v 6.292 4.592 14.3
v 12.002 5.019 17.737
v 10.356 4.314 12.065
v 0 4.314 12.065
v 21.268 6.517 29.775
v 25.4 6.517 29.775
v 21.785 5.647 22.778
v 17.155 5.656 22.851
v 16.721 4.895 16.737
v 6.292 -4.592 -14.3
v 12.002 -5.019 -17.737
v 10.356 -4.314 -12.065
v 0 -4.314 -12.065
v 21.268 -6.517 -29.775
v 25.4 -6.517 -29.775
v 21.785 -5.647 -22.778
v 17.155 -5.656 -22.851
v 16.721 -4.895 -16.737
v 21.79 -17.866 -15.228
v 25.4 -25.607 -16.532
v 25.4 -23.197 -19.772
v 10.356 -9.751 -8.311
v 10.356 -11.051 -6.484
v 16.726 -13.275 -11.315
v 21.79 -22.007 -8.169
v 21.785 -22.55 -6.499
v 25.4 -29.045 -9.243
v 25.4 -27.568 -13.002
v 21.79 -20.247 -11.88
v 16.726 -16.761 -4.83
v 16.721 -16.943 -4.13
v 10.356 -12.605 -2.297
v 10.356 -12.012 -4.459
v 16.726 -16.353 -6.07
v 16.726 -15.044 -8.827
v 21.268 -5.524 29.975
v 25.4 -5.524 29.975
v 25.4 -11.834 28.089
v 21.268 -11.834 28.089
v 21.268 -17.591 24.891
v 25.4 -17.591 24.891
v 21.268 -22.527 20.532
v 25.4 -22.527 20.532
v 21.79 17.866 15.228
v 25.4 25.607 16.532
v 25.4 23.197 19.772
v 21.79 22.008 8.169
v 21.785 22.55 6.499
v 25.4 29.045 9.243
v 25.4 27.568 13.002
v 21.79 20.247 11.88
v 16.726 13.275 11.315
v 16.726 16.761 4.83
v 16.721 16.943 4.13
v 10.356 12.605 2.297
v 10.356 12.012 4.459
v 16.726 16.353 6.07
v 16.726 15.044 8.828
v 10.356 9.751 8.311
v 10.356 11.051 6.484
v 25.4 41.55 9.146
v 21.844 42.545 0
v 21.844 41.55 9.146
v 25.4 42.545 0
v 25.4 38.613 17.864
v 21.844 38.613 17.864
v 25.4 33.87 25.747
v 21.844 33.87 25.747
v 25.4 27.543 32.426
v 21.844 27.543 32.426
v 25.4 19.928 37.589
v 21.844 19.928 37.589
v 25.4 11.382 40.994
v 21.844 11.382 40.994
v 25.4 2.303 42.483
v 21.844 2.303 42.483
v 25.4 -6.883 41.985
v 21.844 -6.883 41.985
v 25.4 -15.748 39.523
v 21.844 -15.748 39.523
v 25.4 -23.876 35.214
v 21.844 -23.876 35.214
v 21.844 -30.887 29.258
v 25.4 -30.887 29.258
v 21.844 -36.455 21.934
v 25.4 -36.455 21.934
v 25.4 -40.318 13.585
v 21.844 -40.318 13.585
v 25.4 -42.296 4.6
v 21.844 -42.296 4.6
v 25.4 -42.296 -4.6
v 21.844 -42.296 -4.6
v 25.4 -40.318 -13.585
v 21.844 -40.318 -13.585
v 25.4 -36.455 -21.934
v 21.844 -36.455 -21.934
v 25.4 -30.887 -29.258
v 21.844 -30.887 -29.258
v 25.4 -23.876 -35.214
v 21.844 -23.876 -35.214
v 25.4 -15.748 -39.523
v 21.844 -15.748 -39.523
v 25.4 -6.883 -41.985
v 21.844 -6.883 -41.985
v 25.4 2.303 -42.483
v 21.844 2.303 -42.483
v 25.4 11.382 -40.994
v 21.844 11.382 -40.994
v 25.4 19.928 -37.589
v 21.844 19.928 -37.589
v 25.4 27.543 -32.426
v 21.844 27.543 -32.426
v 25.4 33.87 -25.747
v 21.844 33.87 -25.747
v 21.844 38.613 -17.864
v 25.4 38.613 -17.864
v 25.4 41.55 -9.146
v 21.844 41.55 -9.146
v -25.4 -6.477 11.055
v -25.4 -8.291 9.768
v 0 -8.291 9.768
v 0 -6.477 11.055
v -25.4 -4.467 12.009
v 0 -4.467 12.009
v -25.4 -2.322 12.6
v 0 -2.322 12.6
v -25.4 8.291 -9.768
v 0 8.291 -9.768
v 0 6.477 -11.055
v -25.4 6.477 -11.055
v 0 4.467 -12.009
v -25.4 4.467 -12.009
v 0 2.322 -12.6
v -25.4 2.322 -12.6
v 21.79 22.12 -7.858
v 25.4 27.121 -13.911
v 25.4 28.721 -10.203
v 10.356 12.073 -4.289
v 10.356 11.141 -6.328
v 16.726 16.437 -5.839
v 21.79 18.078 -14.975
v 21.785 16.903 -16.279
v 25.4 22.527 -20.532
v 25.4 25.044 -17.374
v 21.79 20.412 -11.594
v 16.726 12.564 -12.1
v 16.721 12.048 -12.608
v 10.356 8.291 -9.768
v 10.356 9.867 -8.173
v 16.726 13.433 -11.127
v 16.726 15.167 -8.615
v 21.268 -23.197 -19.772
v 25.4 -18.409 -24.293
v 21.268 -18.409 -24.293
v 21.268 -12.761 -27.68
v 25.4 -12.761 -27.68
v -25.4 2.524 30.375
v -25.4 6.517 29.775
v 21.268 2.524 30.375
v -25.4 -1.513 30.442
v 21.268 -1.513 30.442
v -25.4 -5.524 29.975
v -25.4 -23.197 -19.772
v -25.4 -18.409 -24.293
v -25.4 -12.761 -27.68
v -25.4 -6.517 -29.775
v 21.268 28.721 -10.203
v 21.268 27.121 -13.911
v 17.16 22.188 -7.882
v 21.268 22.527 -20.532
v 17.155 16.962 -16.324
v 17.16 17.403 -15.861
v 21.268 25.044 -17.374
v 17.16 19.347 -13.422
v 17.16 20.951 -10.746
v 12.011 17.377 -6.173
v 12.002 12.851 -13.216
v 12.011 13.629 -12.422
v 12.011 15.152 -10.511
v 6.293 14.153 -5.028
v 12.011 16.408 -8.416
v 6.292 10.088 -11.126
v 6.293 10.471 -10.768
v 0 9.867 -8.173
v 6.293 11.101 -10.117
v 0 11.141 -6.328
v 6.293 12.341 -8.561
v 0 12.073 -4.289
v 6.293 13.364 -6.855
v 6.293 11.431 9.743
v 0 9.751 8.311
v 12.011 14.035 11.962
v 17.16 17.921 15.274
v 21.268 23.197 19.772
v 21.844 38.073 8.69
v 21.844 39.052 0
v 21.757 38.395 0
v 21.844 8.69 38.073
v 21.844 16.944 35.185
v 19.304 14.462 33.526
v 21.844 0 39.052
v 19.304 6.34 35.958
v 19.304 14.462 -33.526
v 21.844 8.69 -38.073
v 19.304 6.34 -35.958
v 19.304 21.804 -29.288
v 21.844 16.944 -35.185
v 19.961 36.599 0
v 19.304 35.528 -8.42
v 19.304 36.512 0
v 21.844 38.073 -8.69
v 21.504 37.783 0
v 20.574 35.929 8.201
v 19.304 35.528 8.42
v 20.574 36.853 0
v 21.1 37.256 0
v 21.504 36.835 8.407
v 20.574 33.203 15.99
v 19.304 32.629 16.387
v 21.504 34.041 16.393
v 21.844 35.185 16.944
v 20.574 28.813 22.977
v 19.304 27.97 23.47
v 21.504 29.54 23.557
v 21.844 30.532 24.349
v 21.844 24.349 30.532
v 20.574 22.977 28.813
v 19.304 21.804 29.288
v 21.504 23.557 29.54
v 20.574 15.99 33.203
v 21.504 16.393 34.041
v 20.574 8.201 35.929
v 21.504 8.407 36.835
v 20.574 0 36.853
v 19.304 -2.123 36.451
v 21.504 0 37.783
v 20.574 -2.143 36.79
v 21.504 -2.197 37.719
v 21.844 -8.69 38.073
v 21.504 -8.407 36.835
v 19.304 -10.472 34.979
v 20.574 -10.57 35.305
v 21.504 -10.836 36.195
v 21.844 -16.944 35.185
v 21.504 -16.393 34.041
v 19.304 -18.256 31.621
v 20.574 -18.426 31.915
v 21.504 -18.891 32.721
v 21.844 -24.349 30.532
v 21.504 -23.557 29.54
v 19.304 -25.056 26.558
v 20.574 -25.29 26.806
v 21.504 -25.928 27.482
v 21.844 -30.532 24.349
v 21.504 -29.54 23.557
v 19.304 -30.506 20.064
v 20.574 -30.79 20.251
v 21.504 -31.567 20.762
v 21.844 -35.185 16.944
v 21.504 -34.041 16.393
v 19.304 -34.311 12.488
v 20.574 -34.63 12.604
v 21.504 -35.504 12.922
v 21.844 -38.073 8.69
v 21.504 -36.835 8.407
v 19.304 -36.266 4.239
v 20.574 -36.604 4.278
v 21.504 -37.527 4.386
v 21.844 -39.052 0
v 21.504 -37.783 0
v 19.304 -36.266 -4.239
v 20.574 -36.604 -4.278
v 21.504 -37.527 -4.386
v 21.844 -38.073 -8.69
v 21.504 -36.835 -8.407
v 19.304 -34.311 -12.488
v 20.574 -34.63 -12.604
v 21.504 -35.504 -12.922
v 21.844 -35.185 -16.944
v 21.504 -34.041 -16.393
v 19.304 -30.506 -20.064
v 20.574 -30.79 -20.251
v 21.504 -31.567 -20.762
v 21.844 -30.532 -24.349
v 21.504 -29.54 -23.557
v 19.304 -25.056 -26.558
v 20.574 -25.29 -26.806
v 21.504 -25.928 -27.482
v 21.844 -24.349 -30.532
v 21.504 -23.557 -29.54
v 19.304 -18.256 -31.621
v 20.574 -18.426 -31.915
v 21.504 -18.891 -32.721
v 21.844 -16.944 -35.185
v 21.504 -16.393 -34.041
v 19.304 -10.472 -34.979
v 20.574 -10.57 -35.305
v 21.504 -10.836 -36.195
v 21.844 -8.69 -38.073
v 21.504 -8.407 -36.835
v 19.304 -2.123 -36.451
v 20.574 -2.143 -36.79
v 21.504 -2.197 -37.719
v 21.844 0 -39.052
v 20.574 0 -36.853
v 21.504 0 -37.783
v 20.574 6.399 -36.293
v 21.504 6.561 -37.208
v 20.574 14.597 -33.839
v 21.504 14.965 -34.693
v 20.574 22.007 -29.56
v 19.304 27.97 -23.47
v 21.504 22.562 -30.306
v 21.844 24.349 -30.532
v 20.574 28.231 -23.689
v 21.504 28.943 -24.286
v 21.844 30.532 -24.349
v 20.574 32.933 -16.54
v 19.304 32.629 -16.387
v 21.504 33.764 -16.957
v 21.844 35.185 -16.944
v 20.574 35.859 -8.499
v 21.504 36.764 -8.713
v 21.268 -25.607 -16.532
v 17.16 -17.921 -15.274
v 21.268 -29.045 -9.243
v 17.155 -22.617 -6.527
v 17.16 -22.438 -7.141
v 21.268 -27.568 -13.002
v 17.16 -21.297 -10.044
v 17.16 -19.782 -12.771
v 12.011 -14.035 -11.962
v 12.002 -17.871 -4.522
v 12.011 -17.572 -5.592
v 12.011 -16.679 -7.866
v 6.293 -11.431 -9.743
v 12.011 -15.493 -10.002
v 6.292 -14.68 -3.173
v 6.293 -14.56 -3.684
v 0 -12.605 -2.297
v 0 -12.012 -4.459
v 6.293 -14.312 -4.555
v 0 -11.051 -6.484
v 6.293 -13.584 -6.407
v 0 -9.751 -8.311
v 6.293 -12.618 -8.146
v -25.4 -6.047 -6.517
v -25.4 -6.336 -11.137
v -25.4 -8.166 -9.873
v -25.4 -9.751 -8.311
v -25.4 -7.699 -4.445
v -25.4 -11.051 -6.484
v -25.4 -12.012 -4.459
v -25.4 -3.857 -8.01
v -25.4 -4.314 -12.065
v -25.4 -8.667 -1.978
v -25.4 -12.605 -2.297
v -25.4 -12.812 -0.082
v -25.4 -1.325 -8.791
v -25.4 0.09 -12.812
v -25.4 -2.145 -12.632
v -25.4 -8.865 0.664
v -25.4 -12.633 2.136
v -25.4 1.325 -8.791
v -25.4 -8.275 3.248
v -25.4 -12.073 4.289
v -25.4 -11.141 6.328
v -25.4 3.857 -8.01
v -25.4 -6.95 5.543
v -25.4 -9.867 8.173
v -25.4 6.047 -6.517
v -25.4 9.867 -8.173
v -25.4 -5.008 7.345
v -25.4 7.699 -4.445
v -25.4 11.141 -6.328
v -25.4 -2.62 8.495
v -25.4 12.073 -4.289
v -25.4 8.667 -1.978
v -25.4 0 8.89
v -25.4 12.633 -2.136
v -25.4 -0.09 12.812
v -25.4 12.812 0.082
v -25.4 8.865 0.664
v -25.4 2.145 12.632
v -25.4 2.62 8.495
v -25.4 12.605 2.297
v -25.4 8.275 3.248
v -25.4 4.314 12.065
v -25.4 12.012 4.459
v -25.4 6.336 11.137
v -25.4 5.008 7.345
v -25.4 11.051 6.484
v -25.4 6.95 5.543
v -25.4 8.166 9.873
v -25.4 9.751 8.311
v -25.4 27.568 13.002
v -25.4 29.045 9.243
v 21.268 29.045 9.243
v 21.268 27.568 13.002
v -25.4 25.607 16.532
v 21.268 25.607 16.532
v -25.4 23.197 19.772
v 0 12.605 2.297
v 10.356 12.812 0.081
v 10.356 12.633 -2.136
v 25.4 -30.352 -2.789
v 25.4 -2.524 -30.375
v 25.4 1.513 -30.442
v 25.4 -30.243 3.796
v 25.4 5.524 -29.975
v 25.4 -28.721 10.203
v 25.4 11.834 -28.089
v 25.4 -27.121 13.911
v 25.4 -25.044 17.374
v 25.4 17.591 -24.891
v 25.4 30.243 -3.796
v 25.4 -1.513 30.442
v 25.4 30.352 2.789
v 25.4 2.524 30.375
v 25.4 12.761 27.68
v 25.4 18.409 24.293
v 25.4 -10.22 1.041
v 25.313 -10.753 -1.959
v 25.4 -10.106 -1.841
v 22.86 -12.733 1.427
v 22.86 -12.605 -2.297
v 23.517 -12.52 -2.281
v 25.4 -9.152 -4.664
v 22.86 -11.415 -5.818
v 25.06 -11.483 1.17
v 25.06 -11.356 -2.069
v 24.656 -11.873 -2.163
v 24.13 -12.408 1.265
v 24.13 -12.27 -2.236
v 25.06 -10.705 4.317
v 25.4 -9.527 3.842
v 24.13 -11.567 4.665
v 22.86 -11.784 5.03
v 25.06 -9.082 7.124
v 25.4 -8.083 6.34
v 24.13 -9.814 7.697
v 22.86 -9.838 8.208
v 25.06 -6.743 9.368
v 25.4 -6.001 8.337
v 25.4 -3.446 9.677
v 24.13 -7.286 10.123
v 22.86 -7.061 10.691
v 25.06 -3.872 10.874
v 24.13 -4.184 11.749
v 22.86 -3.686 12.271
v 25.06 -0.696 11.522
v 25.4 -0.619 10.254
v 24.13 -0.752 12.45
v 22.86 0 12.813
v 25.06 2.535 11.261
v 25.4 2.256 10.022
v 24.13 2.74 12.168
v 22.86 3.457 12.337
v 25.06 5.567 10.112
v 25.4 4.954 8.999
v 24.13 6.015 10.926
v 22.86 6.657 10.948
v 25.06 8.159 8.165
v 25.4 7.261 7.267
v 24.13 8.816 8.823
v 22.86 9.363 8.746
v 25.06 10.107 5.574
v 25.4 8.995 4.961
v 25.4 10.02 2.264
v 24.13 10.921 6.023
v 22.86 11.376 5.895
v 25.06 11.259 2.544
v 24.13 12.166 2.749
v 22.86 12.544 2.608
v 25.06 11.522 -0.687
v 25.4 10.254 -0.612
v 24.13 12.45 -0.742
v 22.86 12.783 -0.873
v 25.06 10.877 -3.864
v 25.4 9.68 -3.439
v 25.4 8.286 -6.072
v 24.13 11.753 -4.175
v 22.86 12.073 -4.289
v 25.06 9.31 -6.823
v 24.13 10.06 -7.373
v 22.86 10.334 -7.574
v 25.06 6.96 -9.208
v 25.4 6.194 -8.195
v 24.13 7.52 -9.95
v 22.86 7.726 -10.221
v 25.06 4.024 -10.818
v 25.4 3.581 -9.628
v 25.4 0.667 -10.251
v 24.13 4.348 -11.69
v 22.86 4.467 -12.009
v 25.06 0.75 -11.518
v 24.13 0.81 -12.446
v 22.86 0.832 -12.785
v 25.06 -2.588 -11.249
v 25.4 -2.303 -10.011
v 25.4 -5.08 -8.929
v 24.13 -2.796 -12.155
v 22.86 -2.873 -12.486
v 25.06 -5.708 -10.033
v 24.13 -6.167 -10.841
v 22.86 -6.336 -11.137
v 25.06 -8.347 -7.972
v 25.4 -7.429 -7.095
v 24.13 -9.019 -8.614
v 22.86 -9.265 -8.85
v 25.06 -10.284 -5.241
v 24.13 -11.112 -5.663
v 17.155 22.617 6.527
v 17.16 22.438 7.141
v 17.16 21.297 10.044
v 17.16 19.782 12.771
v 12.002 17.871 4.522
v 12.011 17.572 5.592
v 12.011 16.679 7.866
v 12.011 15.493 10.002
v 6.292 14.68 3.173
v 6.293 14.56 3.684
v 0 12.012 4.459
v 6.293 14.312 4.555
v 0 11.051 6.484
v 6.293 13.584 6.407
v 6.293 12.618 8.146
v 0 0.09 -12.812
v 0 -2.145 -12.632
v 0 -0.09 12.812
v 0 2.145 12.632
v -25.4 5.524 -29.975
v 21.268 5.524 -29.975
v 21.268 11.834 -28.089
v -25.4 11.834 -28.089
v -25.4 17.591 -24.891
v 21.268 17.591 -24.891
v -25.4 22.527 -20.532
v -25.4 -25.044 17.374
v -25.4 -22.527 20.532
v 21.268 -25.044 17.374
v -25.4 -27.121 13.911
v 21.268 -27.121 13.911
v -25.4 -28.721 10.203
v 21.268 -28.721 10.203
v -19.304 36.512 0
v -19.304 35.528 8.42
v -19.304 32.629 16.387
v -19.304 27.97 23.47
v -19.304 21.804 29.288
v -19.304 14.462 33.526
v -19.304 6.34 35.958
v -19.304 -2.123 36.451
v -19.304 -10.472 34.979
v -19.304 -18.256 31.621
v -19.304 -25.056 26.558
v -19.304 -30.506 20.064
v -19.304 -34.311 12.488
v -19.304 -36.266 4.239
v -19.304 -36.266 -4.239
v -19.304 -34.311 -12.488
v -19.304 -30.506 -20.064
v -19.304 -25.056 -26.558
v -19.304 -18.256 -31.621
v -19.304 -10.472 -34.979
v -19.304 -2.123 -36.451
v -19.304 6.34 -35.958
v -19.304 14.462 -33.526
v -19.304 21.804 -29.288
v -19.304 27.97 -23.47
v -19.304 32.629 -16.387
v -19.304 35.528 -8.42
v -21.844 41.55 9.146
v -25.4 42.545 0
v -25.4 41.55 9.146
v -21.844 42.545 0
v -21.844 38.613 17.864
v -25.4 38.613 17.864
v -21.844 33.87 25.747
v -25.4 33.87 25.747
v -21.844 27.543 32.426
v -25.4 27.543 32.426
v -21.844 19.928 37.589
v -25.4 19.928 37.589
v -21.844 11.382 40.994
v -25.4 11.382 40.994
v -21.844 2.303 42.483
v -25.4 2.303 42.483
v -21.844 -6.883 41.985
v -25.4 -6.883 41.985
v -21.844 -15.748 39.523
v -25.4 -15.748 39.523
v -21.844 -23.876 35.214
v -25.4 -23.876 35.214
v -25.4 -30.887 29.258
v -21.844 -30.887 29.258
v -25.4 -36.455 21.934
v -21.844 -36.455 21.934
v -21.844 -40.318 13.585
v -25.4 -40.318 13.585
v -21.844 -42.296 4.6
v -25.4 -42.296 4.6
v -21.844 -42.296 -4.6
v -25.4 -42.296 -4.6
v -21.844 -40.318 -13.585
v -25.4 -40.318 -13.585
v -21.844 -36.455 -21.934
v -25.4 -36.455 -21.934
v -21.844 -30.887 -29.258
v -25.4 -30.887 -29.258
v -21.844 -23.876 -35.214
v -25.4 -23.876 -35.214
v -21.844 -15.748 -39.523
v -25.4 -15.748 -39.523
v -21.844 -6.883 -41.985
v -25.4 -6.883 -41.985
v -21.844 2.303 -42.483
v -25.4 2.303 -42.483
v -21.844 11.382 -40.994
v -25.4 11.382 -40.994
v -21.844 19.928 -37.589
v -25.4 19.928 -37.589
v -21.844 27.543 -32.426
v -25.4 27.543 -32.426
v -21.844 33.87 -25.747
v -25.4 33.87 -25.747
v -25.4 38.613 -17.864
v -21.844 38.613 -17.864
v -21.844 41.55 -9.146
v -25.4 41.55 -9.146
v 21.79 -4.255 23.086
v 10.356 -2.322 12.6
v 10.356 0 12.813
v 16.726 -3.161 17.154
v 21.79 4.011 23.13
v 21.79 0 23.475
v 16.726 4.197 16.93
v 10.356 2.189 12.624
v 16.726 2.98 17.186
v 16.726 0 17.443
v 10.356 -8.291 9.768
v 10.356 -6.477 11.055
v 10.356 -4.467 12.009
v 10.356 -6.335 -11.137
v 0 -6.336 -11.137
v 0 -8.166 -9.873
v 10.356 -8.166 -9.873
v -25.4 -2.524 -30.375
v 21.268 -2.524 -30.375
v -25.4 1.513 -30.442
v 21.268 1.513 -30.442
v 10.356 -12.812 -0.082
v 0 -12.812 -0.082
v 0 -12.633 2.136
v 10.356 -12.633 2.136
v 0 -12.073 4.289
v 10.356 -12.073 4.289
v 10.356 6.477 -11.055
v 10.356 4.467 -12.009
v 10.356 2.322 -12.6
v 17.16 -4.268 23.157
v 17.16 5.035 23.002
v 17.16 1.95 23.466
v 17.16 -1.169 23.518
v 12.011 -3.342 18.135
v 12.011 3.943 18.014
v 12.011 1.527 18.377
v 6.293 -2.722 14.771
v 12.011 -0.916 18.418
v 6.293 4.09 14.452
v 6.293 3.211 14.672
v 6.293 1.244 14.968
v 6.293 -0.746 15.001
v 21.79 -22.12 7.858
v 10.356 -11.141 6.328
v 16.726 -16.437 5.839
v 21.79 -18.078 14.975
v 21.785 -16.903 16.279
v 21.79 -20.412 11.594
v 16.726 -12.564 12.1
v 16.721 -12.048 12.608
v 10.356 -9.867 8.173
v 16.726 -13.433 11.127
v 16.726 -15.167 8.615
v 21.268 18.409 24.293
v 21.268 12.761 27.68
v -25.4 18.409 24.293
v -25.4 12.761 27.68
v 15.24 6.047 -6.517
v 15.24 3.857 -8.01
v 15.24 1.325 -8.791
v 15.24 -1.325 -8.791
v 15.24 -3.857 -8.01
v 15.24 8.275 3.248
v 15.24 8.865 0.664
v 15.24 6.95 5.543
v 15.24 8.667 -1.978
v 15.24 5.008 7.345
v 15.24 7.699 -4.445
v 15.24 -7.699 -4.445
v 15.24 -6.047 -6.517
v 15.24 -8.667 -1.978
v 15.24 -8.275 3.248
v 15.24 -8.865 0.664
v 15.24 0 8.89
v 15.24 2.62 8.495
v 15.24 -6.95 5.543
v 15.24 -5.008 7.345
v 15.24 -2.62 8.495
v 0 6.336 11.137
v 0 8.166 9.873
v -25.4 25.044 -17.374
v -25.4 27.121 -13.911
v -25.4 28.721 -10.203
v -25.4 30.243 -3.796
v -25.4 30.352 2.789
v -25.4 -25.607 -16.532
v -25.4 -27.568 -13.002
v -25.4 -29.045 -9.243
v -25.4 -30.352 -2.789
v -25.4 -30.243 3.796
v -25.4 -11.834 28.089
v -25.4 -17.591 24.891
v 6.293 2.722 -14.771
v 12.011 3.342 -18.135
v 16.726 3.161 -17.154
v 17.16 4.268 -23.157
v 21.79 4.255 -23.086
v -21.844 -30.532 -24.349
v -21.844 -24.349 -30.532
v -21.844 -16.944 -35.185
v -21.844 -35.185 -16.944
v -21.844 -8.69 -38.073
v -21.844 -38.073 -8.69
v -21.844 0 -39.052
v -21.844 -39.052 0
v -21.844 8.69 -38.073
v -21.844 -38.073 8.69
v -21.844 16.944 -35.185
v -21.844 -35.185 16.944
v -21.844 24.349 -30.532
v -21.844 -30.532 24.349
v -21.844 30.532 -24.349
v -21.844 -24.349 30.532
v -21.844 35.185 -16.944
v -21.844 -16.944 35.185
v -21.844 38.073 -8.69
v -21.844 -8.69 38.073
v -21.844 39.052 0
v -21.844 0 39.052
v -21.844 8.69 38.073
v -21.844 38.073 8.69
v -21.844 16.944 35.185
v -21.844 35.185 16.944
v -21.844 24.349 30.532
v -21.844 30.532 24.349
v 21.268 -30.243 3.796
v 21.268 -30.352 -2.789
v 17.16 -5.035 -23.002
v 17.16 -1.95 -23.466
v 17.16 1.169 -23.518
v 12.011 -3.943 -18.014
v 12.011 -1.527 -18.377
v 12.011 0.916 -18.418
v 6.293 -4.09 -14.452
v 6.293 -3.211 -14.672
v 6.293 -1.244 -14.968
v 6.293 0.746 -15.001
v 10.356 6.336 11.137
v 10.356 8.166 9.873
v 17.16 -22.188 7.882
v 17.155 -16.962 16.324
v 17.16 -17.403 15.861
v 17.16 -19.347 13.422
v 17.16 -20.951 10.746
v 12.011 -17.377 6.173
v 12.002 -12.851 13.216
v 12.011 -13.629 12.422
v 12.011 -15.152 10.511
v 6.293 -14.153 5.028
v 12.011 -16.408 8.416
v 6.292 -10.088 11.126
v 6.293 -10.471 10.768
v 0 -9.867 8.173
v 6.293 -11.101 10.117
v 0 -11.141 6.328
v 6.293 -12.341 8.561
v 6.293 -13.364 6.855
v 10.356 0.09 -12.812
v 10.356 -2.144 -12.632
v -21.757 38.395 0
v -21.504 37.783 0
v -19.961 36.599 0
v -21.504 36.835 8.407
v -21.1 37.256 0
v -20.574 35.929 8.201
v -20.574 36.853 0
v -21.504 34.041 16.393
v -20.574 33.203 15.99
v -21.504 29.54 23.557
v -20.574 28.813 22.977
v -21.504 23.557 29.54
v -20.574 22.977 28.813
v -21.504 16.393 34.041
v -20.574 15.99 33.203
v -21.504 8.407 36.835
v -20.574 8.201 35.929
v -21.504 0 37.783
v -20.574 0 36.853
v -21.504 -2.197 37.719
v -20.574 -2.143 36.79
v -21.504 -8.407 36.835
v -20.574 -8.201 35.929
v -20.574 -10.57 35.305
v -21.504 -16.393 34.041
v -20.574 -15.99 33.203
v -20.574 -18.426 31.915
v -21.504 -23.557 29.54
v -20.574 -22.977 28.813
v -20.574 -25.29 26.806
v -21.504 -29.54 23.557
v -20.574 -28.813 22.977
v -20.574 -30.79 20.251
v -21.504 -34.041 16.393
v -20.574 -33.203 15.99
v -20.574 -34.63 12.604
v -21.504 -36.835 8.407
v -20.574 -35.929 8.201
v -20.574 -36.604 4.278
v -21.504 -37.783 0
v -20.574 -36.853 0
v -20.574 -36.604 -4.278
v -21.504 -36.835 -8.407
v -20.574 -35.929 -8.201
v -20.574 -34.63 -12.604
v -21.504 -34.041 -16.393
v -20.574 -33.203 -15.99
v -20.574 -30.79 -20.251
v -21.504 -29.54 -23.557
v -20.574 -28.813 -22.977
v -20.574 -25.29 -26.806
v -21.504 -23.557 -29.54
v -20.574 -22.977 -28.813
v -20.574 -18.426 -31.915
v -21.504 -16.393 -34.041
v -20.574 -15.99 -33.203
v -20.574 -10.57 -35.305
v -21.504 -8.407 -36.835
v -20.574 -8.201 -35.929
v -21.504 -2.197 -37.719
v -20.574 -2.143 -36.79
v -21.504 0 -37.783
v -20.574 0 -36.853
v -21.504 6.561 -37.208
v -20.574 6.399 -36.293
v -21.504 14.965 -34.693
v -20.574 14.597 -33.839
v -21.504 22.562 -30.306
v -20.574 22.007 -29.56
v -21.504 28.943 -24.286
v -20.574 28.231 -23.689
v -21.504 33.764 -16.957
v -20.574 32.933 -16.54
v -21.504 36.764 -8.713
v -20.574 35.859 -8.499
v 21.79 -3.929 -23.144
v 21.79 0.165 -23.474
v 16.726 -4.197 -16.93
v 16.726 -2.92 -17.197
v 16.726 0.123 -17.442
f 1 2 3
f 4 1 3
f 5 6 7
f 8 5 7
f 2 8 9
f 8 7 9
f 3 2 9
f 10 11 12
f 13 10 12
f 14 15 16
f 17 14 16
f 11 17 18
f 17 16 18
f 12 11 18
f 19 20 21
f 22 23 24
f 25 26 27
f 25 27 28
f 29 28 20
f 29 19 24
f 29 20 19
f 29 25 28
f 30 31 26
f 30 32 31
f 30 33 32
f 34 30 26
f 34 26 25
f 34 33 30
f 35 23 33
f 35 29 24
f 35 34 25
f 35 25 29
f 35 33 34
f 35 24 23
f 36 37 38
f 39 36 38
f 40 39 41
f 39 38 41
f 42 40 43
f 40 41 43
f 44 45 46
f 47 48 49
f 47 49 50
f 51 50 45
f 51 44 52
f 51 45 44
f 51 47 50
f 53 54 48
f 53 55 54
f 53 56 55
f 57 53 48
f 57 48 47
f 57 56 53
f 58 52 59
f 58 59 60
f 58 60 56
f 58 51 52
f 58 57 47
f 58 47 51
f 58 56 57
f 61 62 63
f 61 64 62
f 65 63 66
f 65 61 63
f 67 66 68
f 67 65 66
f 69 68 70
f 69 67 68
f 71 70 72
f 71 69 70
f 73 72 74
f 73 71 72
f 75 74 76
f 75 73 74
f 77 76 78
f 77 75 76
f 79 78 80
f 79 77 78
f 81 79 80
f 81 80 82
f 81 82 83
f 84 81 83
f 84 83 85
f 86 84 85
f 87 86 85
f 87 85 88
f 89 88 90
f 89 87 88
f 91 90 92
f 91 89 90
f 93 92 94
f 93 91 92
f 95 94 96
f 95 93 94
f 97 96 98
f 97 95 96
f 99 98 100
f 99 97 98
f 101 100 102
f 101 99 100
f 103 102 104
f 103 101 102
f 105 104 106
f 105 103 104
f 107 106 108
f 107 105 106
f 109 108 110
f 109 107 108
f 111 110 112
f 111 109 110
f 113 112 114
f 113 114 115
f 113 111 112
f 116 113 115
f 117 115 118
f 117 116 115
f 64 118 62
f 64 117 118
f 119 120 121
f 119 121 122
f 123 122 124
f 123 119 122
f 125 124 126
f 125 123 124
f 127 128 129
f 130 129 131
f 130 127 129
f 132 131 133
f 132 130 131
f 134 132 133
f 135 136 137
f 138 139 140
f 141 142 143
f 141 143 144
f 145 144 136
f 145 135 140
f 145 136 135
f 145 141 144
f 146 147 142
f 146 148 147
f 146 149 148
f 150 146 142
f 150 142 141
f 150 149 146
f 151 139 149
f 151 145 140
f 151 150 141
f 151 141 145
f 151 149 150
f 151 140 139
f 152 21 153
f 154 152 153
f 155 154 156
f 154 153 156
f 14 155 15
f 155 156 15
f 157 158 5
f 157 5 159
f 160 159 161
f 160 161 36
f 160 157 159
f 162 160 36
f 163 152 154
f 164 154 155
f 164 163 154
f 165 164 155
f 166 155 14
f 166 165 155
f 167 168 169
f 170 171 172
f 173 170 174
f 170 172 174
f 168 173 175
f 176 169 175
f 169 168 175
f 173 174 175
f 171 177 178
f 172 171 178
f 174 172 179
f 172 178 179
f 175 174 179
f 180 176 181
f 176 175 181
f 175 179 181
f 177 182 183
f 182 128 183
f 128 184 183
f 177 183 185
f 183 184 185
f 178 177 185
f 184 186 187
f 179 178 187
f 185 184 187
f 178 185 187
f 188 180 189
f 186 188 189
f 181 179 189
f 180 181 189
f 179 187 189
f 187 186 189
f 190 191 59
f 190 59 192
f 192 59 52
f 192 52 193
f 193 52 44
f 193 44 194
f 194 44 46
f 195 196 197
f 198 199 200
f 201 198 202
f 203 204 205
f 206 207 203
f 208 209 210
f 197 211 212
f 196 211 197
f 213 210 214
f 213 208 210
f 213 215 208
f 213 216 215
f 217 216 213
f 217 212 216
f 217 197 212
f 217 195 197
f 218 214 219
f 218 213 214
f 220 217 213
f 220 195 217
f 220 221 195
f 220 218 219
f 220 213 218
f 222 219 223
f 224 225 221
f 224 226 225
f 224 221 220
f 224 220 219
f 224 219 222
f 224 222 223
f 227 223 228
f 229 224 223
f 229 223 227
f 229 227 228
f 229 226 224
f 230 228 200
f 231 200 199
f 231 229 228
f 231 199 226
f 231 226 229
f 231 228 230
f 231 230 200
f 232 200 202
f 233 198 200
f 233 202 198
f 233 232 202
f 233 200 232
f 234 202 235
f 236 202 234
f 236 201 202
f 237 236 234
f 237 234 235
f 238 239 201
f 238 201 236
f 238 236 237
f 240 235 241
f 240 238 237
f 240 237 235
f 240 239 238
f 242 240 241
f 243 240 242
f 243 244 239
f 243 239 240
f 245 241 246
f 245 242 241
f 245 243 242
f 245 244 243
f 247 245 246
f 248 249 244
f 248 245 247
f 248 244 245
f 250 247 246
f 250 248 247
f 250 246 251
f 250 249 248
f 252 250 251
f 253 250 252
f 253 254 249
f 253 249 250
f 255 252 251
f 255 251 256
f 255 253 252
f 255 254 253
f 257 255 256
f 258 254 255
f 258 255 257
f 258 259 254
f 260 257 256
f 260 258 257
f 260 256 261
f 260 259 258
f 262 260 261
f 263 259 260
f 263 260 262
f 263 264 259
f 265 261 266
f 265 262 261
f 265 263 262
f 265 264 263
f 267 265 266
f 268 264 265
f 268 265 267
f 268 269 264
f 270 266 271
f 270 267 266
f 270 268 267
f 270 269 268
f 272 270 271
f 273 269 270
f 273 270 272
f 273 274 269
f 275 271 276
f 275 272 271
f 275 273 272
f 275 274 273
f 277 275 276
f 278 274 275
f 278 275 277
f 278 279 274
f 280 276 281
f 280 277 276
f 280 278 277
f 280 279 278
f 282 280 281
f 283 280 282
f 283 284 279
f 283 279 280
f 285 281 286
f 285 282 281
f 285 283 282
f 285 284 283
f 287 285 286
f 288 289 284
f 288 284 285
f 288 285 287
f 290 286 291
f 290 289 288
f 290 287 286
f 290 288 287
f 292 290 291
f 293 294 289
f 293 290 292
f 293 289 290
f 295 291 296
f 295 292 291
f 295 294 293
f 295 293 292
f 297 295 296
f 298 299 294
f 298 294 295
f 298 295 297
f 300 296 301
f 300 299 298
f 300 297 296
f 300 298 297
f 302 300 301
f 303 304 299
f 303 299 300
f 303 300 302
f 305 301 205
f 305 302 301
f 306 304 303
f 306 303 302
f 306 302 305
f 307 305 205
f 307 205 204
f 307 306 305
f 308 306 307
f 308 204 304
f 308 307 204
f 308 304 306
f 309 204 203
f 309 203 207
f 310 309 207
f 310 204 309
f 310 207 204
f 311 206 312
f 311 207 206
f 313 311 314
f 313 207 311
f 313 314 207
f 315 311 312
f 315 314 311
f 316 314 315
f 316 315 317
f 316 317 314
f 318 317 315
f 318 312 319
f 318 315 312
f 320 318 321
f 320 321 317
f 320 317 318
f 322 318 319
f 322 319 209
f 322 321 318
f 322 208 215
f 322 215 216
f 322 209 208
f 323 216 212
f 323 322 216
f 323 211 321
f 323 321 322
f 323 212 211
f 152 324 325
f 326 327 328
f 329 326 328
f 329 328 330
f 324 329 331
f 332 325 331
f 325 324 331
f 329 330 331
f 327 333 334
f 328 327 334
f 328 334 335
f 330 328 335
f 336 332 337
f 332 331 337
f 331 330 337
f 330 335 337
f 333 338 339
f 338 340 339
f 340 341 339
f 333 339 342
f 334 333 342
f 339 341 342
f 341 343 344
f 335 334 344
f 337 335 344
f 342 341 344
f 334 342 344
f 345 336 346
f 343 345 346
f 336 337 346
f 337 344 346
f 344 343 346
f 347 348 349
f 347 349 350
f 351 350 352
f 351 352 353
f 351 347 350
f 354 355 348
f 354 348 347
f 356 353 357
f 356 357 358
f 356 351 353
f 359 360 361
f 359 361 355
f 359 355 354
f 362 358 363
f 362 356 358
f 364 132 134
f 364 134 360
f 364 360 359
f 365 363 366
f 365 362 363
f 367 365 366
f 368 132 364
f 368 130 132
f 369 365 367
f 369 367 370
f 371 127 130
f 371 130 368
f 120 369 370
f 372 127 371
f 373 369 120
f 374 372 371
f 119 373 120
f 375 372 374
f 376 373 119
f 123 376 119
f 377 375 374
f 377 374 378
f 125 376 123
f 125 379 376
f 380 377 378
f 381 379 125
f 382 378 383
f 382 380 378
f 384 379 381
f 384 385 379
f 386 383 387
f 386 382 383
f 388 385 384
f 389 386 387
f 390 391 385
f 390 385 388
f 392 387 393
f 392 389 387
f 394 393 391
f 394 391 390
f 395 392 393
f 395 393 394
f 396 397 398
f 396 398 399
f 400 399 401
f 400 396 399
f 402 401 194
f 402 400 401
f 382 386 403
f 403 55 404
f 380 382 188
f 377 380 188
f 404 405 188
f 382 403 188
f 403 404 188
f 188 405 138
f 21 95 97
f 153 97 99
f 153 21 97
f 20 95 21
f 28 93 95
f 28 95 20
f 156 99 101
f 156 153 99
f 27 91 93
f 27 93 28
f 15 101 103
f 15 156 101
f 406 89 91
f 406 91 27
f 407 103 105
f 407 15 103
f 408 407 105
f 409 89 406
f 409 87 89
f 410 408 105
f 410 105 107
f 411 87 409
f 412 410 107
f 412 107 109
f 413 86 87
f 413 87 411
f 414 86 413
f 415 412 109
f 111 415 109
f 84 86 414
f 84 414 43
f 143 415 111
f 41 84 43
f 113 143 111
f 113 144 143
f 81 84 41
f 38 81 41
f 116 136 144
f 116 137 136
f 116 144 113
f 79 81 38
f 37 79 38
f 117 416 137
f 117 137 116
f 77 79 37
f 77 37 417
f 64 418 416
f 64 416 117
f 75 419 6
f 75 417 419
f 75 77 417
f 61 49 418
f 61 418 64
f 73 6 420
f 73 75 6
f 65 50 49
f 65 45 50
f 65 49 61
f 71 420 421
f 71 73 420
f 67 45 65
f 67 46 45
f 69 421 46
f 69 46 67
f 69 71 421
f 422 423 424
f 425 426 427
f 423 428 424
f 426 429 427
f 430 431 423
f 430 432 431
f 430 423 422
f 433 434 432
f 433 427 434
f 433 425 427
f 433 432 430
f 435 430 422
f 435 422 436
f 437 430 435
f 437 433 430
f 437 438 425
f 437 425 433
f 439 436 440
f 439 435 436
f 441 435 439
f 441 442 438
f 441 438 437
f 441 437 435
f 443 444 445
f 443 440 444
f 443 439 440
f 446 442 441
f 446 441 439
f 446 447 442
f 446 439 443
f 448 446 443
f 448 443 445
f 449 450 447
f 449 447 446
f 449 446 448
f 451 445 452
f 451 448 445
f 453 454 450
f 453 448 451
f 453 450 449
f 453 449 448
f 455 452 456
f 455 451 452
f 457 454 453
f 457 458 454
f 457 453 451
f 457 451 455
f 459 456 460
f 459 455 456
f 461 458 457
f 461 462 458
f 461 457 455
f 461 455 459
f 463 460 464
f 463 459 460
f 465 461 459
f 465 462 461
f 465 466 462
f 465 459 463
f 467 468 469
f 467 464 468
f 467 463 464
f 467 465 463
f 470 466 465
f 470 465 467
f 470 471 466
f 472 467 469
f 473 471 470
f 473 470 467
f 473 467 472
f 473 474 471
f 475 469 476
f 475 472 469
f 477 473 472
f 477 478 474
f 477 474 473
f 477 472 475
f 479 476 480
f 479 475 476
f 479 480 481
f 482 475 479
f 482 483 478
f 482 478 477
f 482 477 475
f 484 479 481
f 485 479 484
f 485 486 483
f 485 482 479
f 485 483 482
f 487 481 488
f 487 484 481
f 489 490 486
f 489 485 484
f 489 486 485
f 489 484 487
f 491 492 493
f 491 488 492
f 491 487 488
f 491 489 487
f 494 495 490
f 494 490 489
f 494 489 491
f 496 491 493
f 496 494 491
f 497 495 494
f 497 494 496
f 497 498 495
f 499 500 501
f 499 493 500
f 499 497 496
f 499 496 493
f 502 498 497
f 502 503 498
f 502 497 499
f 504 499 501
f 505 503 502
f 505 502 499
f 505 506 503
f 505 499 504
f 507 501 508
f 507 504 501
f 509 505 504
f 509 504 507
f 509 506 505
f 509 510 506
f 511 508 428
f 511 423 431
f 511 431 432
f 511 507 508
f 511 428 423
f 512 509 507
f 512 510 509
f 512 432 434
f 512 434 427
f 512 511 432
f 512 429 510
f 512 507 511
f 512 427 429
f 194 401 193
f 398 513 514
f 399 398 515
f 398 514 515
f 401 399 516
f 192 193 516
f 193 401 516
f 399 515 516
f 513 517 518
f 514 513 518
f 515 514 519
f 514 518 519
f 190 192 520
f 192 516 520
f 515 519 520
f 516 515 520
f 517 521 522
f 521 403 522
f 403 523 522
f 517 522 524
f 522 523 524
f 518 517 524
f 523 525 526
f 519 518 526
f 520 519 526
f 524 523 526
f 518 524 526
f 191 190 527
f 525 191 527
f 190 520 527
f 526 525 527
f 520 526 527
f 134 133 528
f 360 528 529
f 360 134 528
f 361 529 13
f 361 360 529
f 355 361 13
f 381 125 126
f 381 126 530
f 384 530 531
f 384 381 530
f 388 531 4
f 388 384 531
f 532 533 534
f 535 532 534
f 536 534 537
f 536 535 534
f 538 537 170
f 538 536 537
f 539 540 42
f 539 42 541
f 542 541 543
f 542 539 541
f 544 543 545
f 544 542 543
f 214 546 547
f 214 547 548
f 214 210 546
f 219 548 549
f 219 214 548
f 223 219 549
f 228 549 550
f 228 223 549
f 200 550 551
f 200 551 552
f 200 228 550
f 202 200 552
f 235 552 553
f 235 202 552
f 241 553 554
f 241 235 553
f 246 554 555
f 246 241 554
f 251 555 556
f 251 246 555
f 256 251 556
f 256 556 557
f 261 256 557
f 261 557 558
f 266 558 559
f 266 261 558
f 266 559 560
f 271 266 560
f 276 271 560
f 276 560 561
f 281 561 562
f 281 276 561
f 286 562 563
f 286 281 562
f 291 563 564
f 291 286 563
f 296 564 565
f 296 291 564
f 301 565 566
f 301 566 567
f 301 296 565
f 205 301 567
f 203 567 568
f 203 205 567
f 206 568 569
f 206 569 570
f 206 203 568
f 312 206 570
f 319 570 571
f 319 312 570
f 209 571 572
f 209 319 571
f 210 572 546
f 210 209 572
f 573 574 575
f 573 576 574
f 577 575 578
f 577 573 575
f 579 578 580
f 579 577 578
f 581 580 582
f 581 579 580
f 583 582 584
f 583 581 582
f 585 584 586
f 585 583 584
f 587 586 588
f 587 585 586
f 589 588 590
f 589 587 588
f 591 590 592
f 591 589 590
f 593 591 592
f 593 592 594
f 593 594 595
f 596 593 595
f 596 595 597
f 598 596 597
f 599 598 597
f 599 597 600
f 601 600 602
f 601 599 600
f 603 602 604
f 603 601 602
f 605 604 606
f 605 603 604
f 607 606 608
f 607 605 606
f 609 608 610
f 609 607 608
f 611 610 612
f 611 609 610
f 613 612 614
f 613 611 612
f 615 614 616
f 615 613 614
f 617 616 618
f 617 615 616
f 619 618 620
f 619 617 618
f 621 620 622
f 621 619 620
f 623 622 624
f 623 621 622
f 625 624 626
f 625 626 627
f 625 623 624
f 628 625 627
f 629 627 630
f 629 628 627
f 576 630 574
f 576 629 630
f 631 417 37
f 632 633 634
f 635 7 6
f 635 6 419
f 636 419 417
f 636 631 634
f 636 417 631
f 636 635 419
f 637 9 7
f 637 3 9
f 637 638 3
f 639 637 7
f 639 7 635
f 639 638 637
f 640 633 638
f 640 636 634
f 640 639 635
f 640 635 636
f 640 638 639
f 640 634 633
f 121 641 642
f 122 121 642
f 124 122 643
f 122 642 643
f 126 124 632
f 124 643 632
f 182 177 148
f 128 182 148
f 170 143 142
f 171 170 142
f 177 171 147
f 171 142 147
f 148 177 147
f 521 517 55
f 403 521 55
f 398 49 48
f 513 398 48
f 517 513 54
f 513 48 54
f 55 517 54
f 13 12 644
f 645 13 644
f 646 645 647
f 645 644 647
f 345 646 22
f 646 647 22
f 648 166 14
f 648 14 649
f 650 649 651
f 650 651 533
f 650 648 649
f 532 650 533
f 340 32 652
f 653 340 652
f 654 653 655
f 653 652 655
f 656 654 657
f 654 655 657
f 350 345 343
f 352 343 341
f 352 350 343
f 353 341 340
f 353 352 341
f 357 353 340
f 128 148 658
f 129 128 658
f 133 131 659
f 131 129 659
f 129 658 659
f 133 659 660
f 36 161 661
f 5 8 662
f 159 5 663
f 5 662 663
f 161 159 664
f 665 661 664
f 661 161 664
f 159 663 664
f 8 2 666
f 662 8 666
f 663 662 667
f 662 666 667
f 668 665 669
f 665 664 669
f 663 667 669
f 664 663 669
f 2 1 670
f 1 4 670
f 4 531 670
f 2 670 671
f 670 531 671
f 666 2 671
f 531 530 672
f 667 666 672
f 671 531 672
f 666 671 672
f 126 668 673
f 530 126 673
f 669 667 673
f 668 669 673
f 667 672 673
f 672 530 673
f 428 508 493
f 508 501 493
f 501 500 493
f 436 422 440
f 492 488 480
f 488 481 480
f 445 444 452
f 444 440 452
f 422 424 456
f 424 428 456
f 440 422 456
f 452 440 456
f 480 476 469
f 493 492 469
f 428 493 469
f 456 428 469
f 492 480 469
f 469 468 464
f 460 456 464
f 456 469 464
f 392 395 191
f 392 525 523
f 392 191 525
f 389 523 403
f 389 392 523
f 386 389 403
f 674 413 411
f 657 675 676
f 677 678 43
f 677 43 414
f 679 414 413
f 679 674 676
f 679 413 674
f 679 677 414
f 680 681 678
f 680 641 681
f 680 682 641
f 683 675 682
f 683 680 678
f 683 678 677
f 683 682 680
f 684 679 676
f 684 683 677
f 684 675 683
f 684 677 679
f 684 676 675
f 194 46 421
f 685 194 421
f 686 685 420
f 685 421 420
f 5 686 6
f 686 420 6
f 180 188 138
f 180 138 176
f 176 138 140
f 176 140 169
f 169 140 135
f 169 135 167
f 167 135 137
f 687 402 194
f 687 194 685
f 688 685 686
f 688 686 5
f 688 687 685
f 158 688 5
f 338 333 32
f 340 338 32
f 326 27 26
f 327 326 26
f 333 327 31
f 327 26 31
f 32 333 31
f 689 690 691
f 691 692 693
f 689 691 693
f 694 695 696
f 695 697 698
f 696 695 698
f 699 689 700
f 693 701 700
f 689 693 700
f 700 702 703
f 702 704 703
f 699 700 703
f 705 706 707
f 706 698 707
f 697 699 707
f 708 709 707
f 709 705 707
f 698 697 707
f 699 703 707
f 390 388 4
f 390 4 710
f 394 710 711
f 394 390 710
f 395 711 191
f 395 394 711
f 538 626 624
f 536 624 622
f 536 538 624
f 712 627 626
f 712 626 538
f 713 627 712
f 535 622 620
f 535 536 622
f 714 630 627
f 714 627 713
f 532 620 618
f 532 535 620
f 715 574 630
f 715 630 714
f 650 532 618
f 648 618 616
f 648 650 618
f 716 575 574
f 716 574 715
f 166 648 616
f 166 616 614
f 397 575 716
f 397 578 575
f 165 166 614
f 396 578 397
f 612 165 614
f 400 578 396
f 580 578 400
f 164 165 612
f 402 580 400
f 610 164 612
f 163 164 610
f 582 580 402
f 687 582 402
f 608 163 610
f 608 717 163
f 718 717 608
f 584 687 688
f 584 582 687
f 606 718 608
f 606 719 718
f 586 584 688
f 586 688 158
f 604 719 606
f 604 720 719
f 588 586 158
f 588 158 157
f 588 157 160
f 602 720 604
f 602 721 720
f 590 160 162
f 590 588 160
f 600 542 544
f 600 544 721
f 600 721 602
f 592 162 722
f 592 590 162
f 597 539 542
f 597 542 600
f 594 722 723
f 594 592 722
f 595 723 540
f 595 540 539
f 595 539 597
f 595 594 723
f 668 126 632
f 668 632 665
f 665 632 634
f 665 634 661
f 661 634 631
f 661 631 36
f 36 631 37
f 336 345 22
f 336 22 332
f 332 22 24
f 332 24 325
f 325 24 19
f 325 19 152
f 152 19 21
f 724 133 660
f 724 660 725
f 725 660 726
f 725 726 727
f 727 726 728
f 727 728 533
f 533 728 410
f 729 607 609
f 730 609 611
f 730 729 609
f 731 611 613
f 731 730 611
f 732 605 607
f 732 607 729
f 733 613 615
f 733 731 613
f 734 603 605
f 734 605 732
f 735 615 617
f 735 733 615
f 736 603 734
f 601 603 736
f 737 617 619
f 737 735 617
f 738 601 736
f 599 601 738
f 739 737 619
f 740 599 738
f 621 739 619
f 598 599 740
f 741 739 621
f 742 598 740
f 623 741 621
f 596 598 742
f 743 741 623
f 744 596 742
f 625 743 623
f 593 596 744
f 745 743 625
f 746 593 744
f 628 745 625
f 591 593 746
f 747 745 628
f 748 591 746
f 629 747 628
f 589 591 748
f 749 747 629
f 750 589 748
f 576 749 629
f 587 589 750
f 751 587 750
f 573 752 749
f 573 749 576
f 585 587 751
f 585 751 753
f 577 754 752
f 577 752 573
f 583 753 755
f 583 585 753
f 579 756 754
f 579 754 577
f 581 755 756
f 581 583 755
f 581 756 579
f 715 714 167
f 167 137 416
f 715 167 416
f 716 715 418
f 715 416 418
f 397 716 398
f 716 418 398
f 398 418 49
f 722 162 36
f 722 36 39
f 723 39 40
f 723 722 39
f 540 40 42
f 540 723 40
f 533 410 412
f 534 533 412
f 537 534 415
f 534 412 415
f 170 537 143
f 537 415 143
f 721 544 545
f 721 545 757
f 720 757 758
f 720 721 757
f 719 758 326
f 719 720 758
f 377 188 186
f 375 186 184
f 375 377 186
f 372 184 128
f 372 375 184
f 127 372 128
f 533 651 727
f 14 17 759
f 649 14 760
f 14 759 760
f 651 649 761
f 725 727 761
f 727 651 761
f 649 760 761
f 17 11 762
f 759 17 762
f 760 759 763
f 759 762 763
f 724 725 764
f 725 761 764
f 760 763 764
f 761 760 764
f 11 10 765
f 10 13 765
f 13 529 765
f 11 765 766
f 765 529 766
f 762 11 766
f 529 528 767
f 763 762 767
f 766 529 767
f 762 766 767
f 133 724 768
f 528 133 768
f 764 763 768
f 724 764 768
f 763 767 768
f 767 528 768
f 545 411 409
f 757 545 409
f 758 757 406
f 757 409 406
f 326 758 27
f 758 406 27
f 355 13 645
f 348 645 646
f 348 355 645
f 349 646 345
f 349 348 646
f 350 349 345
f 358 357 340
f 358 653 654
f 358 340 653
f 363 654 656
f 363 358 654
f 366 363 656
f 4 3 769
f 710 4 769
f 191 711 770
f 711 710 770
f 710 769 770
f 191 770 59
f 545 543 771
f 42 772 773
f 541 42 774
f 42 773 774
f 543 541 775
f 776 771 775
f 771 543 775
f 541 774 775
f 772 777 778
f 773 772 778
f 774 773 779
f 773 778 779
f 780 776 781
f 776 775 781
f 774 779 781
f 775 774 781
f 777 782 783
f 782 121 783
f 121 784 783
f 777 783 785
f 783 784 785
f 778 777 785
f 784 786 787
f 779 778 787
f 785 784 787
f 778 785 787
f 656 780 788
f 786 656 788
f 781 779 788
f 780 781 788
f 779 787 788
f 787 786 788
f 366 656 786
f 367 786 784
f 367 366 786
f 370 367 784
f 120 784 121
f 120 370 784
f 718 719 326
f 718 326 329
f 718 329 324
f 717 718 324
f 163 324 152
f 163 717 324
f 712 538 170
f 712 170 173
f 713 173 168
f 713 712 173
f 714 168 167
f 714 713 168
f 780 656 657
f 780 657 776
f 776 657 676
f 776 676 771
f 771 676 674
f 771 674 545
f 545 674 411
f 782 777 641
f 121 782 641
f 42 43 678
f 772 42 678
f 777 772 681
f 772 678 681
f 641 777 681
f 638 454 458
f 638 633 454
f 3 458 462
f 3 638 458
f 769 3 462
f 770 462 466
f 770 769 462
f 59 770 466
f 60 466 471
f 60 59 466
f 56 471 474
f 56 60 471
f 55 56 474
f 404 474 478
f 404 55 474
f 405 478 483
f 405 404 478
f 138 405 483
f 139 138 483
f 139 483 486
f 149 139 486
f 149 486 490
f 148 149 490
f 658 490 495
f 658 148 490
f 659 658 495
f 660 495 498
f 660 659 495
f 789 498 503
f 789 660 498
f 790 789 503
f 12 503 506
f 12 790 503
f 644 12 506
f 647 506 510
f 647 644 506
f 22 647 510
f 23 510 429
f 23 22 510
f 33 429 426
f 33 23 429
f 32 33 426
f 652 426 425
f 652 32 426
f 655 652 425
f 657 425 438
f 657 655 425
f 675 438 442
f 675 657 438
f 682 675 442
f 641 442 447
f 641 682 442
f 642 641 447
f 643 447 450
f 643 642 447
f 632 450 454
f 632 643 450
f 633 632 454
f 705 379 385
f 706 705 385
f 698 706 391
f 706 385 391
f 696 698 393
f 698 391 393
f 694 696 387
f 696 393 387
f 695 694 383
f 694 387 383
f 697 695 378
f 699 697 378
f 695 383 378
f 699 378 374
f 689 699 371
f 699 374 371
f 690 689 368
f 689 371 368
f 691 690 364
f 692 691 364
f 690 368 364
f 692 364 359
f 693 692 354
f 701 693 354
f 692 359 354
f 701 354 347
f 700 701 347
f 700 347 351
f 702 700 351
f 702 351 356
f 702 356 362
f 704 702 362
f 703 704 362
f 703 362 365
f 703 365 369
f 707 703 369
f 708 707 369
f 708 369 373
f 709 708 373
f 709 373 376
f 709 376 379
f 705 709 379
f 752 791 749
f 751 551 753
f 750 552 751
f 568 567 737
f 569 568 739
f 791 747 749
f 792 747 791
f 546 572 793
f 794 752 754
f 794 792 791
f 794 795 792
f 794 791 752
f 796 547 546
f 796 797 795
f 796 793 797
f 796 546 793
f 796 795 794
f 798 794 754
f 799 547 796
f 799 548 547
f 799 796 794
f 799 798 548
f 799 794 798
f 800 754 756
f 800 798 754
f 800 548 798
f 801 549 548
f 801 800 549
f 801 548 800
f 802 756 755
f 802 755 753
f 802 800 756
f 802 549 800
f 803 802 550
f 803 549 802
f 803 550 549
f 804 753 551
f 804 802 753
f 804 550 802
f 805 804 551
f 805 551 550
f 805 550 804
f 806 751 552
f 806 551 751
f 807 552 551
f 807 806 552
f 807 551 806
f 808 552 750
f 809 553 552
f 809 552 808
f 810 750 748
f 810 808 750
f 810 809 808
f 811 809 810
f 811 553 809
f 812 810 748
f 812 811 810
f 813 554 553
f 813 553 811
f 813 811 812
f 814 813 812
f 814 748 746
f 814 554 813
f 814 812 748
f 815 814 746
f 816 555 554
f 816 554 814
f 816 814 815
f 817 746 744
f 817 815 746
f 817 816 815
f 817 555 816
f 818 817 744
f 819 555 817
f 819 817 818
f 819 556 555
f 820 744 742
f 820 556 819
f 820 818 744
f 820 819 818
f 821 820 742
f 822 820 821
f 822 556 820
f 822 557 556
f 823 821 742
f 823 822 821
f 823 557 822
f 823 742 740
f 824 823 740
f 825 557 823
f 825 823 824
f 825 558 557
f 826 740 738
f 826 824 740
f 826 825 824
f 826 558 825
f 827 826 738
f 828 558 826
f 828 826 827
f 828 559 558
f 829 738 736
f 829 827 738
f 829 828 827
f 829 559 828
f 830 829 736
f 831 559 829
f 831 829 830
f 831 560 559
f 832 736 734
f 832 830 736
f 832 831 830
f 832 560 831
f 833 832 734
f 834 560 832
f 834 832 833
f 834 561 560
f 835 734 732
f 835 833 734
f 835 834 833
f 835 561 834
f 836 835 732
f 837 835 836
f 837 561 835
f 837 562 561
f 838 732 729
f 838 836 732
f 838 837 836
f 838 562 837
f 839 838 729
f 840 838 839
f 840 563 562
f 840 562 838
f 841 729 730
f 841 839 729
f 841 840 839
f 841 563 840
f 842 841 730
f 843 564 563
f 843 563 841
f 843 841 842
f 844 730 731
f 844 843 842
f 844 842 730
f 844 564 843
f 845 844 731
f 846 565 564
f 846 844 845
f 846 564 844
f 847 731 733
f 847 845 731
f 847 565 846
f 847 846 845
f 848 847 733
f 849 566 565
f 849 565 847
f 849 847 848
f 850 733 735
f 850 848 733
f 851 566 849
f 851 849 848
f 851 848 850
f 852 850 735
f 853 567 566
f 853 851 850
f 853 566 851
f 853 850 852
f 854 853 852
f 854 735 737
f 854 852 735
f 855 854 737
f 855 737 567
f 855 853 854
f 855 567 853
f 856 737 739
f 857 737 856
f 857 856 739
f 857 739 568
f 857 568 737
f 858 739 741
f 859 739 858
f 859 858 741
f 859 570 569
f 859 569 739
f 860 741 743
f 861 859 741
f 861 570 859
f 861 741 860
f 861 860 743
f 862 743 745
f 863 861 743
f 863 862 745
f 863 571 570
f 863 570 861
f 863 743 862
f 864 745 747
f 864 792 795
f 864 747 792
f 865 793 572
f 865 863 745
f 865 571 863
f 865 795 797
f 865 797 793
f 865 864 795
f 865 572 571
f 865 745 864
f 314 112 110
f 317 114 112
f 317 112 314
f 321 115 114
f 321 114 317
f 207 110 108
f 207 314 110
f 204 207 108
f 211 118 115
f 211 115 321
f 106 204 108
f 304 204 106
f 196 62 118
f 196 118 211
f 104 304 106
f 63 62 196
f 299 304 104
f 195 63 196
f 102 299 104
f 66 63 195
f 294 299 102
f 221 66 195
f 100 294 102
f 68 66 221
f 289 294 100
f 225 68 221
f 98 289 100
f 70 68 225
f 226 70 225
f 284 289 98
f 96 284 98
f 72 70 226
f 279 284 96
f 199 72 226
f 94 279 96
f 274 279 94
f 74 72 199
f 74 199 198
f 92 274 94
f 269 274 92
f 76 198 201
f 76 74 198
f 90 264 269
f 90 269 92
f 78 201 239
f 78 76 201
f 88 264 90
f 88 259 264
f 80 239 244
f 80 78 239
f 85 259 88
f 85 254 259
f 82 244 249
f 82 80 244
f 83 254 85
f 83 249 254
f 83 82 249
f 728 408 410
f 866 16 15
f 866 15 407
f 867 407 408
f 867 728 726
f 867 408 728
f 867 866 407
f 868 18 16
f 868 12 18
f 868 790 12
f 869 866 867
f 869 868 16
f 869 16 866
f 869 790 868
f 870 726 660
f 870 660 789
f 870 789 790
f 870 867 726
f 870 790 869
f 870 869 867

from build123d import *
from build123d.topology import SkipClean

# Parameters (mm, degrees)
SKETCH2_R           = 12.812507943
SKETCH2_R_2         = 8.89
BOSS_EXTRUDE1_DEPTH = 50.8
SKETCH3_R           = 12.812507943
BOSS_EXTRUDE2_DEPTH = 10.16
CUT_EXTRUDE1_DEPTH  = 79.745120801
CIRPATTERN1_COUNT   = 6
FILLET1_R           = 2.54


# Read off the part's stored shape, not the designer's step: Revolve1
with BuildPart() as part:
    # Revolve1 outline → Revolve1 (revolve)
    with BuildSketch(Plane.YX):
        with BuildLine():
            Line((8.89, 0), (12.812507943, 0))
            add(Edge.make_bspline(
                [(30.48, 21.267937651), (30.309023597, 21.192105008), (29.508904573, 20.830209988), (27.54071299, 19.853128917), (24.775190006, 18.16464464), (21.854472712, 15.840046365), (19.302035246, 13.206553615), (17.10058625, 10.247215331), (15.23937391, 6.941426723), (13.969670275, 3.872573278), (13.216678126, 1.508927527), (12.91724489, 0.408653288), (12.812507943, 0)],
                knots=[0.045662691, 0.045662691, 0.045662691, 0.045662691, 0.0625, 0.125, 0.25, 0.375, 0.5, 0.625, 0.75, 0.875, 0.9375, 0.974110002, 0.974110002, 0.974110002, 0.974110002], degree=3))
            Line((30.48, 21.267937651), (30.48, -25.4))
            Line((30.48, -25.4), (42.545, -25.4))
            Line((42.545, -25.4), (42.545, -21.844))
            Line((42.545, -21.844), (39.0525, -21.844))
            ThreePointArc((39.0525, -21.844), (37.256448776, -21.100051224), (36.5125, -19.304))
            Line((36.5125, -19.304), (36.5125, 19.304))
            ThreePointArc((36.5125, 19.304), (37.256448776, 21.100051224), (39.0525, 21.844))
            Line((39.0525, 21.844), (42.545, 21.844))
            Line((42.545, 21.844), (42.545, 25.4))
            Line((42.545, 25.4), (30.48, 25.4))
            add(Edge.make_bspline(
                [(30.48, 25.4), (13.230283967, 18.539405633), (8.89, 0)],
                knots=[0.751440896, 0.751440896, 0.751440896, 1.751440896, 1.751440896, 1.751440896], degree=2))
        make_face()
    revolve(axis=Axis((0, 0, 0), (1, 0, 0)))



with BuildPart() as body_2:
    # Sketch2 → Boss-Extrude1 (new body)
    with BuildSketch(Plane.ZY.offset(25.4)):
        Circle(SKETCH2_R)
        Circle(SKETCH2_R_2, mode=Mode.SUBTRACT)
    extrude(amount=-BOSS_EXTRUDE1_DEPTH)


with BuildPart() as part_1:
    add(part.part)

    add(body_2.part)  # Boss-Extrude2 merges body 2
    # Sketch3 → Boss-Extrude2 (add)
    with BuildSketch(Plane(origin=(25.4, 0, 0), x_dir=(0, 0, -1), z_dir=(1, 0, 0))):
        with Locations(Location((0, 0, 0), (0, 0, 180))):
            Circle(SKETCH3_R)
    extrude(amount=-BOSS_EXTRUDE2_DEPTH)

    # Sketch4 → Cut-Extrude1 (cut, through all)
    with BuildSketch(Plane(origin=(25.4, 0, 0), x_dir=(0, 0, -1), z_dir=(1, 0, 0))):
        with BuildLine():
            Line((-9.243384813, 29.044624928), (-2.296598789, 12.604998762))
            ThreePointArc((-2.296598789, 12.604998762), (1.031106032, 12.770950636), (4.289083469, 12.07328136))
            Line((4.289083469, 12.07328136), (10.203409411, 28.721435138))
            ThreePointArc((10.203409411, 28.721435138), (0.506482692, 30.475791627), (-9.243384813, 29.044624928))
        make_face()
    cut_extrude1 = extrude(amount=-CUT_EXTRUDE1_DEPTH, mode=Mode.SUBTRACT)

    # CirPattern1: Cut-Extrude1 ×6 about axis
    with SkipClean():  # the faces are left unmerged after this step: merging them gives an invalid solid
        cirpattern1_axis = Axis((0, 0, 0), (1, 0, 0))
        for i in range(1, CIRPATTERN1_COUNT):
            add(cut_extrude1.rotate(cirpattern1_axis, i * 360 / CIRPATTERN1_COUNT), mode=Mode.SUBTRACT)

    # Fillet1
    fillet1_edges = [part_1.edges().sort_by_distance(p)[0] for p in [
        (25.4, 12.027308376, 4.416357439),
    ]]
    fillet(fillet1_edges, radius=FILLET1_R)


solid = part_1.part
